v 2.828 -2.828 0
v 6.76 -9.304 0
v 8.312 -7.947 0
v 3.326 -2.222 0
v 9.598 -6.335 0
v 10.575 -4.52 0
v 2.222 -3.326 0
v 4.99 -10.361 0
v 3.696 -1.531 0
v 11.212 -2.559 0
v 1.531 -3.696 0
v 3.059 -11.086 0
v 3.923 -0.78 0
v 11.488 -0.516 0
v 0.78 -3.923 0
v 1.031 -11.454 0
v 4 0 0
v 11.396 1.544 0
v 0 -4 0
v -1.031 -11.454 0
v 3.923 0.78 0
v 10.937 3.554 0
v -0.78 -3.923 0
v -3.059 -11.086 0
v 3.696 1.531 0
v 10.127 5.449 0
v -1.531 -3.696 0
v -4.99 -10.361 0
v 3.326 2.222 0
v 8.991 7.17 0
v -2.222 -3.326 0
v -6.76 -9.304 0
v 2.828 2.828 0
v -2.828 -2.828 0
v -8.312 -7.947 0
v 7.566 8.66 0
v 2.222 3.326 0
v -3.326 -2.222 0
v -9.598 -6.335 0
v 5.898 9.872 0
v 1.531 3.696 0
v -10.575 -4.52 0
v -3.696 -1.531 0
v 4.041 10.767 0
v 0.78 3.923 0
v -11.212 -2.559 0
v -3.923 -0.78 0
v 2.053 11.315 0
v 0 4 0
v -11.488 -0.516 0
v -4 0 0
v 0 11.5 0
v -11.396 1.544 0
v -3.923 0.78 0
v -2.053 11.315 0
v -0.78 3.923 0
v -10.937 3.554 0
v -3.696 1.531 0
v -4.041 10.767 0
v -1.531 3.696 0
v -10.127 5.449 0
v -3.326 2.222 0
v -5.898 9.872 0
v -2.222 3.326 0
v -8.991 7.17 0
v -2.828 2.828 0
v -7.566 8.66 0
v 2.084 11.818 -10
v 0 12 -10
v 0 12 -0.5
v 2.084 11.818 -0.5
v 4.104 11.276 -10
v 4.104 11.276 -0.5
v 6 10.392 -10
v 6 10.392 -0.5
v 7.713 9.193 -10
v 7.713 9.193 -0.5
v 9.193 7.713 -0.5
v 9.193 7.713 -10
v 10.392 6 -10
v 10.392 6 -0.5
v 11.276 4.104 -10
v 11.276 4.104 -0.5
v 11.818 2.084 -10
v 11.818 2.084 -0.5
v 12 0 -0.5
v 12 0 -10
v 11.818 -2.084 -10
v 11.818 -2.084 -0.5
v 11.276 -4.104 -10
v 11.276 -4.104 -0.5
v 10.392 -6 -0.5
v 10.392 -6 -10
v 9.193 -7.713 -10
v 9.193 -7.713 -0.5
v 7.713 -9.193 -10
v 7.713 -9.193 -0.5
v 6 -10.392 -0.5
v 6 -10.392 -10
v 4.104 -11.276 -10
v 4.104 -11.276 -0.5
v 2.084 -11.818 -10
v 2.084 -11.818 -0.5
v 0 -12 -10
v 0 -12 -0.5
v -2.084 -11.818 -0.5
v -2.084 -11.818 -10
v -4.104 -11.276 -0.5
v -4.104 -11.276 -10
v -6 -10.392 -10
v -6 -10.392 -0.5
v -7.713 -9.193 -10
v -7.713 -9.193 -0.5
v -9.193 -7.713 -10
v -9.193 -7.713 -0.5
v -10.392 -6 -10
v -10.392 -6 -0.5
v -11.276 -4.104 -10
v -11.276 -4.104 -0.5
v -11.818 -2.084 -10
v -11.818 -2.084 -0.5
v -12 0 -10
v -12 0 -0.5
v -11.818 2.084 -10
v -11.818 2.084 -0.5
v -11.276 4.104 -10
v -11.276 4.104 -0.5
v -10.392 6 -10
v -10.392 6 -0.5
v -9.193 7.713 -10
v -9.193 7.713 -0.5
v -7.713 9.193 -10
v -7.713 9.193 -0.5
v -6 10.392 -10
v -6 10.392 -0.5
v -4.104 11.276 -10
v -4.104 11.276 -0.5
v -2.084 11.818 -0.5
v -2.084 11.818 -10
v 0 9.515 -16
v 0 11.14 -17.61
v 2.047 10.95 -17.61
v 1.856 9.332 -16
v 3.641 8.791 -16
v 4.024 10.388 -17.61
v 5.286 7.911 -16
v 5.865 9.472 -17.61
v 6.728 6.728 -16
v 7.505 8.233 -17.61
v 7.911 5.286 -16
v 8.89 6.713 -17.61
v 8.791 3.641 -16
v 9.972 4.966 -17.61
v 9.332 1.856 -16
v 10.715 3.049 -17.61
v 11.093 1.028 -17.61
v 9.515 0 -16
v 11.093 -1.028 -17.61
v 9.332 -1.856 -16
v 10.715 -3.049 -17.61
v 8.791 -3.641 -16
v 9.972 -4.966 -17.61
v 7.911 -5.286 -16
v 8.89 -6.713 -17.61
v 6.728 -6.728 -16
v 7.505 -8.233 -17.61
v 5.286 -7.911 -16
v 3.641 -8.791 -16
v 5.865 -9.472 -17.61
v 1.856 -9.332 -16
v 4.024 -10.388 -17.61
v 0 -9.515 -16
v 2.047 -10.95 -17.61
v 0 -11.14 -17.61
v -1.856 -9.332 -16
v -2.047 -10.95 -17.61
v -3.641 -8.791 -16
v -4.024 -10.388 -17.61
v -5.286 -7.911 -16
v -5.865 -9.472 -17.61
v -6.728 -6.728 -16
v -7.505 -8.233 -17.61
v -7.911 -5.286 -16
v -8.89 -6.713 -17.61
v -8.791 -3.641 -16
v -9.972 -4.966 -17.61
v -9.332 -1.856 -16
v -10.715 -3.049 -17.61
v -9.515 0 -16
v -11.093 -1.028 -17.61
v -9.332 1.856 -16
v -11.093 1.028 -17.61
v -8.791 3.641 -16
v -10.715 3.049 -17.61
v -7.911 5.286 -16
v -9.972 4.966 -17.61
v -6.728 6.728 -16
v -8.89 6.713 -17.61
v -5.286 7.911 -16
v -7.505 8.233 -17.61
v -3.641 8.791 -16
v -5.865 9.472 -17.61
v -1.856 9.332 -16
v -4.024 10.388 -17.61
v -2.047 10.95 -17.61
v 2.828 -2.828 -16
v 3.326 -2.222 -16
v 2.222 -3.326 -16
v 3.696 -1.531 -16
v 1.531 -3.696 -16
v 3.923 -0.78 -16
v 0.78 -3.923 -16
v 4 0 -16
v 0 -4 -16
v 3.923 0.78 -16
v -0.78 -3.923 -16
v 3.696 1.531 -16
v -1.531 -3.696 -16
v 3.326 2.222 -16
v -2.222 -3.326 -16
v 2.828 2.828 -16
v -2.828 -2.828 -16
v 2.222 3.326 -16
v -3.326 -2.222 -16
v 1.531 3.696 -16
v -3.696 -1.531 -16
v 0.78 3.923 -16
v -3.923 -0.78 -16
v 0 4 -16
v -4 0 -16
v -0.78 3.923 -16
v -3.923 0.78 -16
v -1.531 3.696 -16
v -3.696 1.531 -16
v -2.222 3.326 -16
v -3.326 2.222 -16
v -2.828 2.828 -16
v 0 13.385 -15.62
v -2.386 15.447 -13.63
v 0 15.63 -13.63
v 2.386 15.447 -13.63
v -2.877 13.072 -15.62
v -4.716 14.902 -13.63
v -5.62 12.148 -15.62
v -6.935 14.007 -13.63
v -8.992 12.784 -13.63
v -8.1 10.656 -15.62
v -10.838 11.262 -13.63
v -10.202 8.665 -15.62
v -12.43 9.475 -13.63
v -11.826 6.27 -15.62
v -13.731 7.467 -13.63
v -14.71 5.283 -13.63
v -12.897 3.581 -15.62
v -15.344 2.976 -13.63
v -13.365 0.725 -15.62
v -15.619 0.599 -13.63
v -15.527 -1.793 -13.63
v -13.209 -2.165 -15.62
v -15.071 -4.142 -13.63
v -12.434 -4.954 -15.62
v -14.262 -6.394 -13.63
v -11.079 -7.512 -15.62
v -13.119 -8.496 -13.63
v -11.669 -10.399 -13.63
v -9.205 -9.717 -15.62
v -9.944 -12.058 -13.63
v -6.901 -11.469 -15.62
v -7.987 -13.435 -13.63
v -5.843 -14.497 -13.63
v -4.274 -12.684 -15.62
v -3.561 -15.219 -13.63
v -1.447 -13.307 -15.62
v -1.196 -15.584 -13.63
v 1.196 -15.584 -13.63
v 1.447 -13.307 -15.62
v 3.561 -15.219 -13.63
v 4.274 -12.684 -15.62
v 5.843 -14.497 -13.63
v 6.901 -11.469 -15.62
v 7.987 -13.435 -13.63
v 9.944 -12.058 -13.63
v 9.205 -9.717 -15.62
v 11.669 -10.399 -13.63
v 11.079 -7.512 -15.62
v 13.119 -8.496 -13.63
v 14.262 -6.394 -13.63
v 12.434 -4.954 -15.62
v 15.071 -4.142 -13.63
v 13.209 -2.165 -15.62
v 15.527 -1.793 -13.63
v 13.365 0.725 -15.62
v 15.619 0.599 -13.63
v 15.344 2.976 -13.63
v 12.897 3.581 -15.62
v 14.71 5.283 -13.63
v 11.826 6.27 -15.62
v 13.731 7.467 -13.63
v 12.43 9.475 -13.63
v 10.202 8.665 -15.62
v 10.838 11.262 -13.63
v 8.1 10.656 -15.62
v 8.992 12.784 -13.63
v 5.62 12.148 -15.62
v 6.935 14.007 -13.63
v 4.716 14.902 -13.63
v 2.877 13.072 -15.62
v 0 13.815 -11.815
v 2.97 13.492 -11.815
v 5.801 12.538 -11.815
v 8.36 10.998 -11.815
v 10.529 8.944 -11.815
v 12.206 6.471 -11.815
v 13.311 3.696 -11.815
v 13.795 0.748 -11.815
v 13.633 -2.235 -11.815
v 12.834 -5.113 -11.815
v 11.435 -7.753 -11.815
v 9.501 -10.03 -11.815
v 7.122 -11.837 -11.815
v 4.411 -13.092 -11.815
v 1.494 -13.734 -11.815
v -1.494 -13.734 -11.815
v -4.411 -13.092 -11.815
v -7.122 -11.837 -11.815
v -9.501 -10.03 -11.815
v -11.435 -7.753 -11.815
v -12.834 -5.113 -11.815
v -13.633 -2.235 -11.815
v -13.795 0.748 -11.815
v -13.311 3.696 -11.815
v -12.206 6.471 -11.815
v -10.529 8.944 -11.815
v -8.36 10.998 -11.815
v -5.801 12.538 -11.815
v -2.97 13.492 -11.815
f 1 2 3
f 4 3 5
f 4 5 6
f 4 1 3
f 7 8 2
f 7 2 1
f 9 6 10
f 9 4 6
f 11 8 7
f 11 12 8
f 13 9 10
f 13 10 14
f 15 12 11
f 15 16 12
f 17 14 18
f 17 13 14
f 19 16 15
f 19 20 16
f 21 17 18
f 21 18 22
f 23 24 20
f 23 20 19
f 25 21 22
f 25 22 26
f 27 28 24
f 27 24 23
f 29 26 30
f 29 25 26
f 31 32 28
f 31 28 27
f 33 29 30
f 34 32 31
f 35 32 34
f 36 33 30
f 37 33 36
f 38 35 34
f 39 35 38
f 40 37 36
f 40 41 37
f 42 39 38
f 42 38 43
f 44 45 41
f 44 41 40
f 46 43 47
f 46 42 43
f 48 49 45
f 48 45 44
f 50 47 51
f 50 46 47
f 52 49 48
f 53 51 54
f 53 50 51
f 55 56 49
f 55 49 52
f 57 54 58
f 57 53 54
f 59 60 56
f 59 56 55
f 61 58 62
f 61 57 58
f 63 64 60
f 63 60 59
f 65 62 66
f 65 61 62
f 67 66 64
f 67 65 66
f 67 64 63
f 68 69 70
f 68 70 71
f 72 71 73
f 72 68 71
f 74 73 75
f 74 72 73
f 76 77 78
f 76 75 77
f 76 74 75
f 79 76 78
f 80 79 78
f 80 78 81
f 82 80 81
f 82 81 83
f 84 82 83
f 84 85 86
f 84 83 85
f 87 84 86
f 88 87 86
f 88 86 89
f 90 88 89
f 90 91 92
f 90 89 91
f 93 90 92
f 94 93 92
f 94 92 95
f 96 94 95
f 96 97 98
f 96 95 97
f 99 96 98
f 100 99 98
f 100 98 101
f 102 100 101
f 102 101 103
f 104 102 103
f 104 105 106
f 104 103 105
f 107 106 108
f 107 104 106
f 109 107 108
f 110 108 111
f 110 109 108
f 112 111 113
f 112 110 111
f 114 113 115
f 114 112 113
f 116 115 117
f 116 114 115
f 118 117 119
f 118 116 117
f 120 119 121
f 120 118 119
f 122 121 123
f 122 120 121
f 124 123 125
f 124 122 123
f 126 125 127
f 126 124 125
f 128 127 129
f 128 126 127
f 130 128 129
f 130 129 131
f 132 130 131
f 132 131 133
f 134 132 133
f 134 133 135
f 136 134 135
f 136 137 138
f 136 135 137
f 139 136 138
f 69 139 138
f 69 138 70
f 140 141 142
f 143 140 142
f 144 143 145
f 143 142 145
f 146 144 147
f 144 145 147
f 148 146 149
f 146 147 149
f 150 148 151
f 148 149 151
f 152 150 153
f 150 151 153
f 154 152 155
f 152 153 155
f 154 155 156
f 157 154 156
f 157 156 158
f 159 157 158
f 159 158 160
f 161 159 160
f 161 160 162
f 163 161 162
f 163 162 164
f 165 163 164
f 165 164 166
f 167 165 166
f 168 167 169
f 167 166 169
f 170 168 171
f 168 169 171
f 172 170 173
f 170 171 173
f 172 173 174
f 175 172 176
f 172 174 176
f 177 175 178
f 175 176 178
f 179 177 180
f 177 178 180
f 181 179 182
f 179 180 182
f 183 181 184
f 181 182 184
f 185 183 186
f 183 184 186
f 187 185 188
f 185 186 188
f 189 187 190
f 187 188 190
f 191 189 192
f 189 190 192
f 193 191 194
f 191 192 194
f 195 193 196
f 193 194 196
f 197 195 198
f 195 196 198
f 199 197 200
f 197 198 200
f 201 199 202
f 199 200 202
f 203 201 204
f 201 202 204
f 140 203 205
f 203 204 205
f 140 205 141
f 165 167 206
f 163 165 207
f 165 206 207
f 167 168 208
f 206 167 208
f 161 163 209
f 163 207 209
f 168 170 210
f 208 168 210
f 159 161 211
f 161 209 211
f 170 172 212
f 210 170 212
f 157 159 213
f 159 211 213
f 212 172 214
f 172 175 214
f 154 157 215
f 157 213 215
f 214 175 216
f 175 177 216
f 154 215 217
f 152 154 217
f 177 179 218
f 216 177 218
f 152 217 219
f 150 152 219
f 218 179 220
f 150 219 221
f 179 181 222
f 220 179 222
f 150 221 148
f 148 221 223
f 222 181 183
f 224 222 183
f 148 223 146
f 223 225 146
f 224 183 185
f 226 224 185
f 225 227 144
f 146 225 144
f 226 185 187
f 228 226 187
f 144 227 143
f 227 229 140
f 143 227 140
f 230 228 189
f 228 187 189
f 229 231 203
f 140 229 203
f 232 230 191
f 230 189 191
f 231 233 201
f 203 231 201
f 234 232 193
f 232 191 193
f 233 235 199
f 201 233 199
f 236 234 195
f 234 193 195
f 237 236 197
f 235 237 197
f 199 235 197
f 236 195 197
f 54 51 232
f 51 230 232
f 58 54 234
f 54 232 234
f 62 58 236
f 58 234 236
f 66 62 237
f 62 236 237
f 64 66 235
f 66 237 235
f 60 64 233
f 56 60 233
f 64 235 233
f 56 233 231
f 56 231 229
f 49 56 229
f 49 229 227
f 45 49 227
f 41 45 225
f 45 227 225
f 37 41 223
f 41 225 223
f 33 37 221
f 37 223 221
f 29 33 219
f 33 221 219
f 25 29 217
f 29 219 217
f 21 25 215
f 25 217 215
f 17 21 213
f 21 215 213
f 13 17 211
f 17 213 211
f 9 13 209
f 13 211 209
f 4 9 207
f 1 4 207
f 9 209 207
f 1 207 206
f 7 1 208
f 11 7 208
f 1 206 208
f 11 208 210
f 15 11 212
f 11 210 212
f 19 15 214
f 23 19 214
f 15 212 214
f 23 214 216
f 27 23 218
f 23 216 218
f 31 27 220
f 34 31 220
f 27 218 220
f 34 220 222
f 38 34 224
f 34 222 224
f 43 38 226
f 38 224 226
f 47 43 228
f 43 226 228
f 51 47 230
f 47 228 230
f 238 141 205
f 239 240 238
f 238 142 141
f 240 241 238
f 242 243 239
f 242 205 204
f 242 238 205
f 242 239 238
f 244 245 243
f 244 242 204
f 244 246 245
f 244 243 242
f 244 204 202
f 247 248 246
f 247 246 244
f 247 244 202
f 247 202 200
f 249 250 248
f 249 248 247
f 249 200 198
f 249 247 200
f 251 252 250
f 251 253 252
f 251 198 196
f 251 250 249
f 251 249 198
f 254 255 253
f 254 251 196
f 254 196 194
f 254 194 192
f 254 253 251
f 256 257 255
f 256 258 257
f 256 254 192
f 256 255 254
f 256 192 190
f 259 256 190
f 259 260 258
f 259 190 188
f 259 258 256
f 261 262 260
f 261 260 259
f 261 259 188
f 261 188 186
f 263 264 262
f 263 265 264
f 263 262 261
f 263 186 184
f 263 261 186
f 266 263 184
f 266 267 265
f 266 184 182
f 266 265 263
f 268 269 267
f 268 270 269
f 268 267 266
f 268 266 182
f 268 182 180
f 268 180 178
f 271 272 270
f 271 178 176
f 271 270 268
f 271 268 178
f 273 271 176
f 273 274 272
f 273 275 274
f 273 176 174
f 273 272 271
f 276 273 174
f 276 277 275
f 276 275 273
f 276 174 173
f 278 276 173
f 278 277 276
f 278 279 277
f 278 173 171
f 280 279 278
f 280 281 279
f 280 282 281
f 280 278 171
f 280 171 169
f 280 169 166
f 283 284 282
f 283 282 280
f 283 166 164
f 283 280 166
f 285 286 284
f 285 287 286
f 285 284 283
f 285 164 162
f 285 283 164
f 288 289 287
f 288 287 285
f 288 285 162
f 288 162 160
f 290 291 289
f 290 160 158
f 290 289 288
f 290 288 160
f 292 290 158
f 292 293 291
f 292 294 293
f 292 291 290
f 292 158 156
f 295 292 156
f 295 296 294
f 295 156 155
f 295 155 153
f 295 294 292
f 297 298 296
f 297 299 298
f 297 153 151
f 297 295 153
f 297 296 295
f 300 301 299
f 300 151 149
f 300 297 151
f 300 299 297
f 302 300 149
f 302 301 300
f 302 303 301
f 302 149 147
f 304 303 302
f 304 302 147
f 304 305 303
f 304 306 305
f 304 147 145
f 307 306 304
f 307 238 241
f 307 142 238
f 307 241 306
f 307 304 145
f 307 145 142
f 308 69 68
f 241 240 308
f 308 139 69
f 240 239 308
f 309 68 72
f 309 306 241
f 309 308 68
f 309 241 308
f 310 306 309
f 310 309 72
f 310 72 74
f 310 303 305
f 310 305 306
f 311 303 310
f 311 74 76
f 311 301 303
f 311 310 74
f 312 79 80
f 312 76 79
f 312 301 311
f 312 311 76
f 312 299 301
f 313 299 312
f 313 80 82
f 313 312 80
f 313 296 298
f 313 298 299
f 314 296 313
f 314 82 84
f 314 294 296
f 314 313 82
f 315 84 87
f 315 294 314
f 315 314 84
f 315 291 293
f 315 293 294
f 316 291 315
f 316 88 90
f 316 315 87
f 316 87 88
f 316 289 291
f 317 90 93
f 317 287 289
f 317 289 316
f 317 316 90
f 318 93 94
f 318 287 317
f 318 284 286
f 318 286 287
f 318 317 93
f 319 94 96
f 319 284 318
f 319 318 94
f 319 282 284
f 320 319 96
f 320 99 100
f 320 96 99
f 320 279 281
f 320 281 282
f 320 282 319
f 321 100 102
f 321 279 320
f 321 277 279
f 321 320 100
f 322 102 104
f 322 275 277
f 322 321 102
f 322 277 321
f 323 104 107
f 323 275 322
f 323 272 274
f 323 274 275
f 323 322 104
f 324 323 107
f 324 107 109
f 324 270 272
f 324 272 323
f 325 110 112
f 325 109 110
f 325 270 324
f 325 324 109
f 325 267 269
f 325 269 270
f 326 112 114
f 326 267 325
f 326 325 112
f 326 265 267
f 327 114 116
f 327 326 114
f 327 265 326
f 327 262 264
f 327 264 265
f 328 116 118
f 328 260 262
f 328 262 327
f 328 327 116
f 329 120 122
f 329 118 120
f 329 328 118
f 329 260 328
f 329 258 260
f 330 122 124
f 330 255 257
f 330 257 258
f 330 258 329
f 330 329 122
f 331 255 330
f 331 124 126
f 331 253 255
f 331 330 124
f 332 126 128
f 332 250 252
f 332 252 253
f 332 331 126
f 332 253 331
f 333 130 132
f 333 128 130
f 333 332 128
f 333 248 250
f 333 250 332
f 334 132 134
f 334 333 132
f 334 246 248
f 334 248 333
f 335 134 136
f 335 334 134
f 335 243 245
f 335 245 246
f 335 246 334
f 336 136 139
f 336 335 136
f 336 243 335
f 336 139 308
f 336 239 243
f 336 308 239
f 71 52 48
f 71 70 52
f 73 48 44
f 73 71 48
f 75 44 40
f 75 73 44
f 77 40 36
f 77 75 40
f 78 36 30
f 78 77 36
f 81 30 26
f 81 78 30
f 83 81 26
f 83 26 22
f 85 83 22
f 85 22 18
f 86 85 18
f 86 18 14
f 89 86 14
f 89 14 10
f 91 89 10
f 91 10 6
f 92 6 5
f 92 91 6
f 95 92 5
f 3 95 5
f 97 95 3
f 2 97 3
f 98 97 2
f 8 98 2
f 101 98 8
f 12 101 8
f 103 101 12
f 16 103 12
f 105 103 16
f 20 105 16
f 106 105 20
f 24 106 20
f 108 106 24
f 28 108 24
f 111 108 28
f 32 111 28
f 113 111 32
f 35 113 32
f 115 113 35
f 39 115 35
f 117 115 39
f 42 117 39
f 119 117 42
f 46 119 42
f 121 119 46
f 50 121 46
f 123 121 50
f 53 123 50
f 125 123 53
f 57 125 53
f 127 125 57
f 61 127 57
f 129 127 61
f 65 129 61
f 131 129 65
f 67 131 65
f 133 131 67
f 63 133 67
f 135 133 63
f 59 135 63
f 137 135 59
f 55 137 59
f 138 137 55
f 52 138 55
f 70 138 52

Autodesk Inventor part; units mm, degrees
ref_plane "YZ Plane" through (0, 0, 0) normal (1, 0, 0) x (0, 1, 0)
ref_plane "XZ Plane" through (0, 0, 0) normal (0, 1, 0) x (-1, 0, 0)
ref_plane "XY Plane" through (0, 0, 0) normal (0, 0, 1) x (1, 0, 0)
sketch "Sketch1" plane through (0, 0, 0) normal (1, 0, 0) x (0, 1, 0)
  line L0 (0, 0) -> (12, 0)
  line L1 (12, 0) -> (12, -10)
  line L2 (12, -10) -> (15.63, -13.63)
  line L3 (15.63, -13.63) -> (11.1401, -17.61)
  line L4 (11.1401, -17.61) -> (9.515, -16)
  line L5 (9.515, -16) -> (0, -16)
  line L6 (0, -16) -> (0, 0)
  dimension "d0" = 12
  dimension "d1" = 10
  dimension "d2" = 15.63
  dimension "d3" = 13.63
  dimension "d4" = 17.61
  dimension "d5" = 6
  dimension "d6" = 9.515
  dimension "d7" = 16
revolve "Revolution1" add sketch "Sketch1" angle 360 about axis through (0, 0, -16) along (0, 0, 1)
chamfer "Chamfer1" distance 0.5 angle 45 1 edges at (0, -12, 0)
sketch "Sketch2" plane through (0, 0, -16) normal (0, 0, -1) x (-1, 0, 0)
  circle A0 centre (0, 0) radius 4
  dimension "d12" = 8
extrude "Extrusion1" cut sketch "Sketch2" against normal up to next
equation "\"d0\" = 0.5 * Be"
equation "\"d1\" = He"
equation "\"d2\" = 0.5 * De"
equation "\"d3\" = Ge"
equation "\"d4\" = Fe"
equation "\"d5\" = Je"
equation "\"d6\" = 0.5 * Ke"
equation "\"d7\" = Le"
equation "\"d12\" = Ae"
equation "\"Ae\" = 8"
equation "\"Be\" = 24"
equation "\"De\" = 31.26"
equation "\"Ee\" = 28"
equation "\"Fe\" = 17.61"
equation "\"Ge\" = 13.63"
equation "\"He\" = 10"
equation "\"Je\" = 6"
equation "\"Ke\" = 19.03"
equation "\"Le\" = 16"
properties part number "Engrenage_spiro_conique"
